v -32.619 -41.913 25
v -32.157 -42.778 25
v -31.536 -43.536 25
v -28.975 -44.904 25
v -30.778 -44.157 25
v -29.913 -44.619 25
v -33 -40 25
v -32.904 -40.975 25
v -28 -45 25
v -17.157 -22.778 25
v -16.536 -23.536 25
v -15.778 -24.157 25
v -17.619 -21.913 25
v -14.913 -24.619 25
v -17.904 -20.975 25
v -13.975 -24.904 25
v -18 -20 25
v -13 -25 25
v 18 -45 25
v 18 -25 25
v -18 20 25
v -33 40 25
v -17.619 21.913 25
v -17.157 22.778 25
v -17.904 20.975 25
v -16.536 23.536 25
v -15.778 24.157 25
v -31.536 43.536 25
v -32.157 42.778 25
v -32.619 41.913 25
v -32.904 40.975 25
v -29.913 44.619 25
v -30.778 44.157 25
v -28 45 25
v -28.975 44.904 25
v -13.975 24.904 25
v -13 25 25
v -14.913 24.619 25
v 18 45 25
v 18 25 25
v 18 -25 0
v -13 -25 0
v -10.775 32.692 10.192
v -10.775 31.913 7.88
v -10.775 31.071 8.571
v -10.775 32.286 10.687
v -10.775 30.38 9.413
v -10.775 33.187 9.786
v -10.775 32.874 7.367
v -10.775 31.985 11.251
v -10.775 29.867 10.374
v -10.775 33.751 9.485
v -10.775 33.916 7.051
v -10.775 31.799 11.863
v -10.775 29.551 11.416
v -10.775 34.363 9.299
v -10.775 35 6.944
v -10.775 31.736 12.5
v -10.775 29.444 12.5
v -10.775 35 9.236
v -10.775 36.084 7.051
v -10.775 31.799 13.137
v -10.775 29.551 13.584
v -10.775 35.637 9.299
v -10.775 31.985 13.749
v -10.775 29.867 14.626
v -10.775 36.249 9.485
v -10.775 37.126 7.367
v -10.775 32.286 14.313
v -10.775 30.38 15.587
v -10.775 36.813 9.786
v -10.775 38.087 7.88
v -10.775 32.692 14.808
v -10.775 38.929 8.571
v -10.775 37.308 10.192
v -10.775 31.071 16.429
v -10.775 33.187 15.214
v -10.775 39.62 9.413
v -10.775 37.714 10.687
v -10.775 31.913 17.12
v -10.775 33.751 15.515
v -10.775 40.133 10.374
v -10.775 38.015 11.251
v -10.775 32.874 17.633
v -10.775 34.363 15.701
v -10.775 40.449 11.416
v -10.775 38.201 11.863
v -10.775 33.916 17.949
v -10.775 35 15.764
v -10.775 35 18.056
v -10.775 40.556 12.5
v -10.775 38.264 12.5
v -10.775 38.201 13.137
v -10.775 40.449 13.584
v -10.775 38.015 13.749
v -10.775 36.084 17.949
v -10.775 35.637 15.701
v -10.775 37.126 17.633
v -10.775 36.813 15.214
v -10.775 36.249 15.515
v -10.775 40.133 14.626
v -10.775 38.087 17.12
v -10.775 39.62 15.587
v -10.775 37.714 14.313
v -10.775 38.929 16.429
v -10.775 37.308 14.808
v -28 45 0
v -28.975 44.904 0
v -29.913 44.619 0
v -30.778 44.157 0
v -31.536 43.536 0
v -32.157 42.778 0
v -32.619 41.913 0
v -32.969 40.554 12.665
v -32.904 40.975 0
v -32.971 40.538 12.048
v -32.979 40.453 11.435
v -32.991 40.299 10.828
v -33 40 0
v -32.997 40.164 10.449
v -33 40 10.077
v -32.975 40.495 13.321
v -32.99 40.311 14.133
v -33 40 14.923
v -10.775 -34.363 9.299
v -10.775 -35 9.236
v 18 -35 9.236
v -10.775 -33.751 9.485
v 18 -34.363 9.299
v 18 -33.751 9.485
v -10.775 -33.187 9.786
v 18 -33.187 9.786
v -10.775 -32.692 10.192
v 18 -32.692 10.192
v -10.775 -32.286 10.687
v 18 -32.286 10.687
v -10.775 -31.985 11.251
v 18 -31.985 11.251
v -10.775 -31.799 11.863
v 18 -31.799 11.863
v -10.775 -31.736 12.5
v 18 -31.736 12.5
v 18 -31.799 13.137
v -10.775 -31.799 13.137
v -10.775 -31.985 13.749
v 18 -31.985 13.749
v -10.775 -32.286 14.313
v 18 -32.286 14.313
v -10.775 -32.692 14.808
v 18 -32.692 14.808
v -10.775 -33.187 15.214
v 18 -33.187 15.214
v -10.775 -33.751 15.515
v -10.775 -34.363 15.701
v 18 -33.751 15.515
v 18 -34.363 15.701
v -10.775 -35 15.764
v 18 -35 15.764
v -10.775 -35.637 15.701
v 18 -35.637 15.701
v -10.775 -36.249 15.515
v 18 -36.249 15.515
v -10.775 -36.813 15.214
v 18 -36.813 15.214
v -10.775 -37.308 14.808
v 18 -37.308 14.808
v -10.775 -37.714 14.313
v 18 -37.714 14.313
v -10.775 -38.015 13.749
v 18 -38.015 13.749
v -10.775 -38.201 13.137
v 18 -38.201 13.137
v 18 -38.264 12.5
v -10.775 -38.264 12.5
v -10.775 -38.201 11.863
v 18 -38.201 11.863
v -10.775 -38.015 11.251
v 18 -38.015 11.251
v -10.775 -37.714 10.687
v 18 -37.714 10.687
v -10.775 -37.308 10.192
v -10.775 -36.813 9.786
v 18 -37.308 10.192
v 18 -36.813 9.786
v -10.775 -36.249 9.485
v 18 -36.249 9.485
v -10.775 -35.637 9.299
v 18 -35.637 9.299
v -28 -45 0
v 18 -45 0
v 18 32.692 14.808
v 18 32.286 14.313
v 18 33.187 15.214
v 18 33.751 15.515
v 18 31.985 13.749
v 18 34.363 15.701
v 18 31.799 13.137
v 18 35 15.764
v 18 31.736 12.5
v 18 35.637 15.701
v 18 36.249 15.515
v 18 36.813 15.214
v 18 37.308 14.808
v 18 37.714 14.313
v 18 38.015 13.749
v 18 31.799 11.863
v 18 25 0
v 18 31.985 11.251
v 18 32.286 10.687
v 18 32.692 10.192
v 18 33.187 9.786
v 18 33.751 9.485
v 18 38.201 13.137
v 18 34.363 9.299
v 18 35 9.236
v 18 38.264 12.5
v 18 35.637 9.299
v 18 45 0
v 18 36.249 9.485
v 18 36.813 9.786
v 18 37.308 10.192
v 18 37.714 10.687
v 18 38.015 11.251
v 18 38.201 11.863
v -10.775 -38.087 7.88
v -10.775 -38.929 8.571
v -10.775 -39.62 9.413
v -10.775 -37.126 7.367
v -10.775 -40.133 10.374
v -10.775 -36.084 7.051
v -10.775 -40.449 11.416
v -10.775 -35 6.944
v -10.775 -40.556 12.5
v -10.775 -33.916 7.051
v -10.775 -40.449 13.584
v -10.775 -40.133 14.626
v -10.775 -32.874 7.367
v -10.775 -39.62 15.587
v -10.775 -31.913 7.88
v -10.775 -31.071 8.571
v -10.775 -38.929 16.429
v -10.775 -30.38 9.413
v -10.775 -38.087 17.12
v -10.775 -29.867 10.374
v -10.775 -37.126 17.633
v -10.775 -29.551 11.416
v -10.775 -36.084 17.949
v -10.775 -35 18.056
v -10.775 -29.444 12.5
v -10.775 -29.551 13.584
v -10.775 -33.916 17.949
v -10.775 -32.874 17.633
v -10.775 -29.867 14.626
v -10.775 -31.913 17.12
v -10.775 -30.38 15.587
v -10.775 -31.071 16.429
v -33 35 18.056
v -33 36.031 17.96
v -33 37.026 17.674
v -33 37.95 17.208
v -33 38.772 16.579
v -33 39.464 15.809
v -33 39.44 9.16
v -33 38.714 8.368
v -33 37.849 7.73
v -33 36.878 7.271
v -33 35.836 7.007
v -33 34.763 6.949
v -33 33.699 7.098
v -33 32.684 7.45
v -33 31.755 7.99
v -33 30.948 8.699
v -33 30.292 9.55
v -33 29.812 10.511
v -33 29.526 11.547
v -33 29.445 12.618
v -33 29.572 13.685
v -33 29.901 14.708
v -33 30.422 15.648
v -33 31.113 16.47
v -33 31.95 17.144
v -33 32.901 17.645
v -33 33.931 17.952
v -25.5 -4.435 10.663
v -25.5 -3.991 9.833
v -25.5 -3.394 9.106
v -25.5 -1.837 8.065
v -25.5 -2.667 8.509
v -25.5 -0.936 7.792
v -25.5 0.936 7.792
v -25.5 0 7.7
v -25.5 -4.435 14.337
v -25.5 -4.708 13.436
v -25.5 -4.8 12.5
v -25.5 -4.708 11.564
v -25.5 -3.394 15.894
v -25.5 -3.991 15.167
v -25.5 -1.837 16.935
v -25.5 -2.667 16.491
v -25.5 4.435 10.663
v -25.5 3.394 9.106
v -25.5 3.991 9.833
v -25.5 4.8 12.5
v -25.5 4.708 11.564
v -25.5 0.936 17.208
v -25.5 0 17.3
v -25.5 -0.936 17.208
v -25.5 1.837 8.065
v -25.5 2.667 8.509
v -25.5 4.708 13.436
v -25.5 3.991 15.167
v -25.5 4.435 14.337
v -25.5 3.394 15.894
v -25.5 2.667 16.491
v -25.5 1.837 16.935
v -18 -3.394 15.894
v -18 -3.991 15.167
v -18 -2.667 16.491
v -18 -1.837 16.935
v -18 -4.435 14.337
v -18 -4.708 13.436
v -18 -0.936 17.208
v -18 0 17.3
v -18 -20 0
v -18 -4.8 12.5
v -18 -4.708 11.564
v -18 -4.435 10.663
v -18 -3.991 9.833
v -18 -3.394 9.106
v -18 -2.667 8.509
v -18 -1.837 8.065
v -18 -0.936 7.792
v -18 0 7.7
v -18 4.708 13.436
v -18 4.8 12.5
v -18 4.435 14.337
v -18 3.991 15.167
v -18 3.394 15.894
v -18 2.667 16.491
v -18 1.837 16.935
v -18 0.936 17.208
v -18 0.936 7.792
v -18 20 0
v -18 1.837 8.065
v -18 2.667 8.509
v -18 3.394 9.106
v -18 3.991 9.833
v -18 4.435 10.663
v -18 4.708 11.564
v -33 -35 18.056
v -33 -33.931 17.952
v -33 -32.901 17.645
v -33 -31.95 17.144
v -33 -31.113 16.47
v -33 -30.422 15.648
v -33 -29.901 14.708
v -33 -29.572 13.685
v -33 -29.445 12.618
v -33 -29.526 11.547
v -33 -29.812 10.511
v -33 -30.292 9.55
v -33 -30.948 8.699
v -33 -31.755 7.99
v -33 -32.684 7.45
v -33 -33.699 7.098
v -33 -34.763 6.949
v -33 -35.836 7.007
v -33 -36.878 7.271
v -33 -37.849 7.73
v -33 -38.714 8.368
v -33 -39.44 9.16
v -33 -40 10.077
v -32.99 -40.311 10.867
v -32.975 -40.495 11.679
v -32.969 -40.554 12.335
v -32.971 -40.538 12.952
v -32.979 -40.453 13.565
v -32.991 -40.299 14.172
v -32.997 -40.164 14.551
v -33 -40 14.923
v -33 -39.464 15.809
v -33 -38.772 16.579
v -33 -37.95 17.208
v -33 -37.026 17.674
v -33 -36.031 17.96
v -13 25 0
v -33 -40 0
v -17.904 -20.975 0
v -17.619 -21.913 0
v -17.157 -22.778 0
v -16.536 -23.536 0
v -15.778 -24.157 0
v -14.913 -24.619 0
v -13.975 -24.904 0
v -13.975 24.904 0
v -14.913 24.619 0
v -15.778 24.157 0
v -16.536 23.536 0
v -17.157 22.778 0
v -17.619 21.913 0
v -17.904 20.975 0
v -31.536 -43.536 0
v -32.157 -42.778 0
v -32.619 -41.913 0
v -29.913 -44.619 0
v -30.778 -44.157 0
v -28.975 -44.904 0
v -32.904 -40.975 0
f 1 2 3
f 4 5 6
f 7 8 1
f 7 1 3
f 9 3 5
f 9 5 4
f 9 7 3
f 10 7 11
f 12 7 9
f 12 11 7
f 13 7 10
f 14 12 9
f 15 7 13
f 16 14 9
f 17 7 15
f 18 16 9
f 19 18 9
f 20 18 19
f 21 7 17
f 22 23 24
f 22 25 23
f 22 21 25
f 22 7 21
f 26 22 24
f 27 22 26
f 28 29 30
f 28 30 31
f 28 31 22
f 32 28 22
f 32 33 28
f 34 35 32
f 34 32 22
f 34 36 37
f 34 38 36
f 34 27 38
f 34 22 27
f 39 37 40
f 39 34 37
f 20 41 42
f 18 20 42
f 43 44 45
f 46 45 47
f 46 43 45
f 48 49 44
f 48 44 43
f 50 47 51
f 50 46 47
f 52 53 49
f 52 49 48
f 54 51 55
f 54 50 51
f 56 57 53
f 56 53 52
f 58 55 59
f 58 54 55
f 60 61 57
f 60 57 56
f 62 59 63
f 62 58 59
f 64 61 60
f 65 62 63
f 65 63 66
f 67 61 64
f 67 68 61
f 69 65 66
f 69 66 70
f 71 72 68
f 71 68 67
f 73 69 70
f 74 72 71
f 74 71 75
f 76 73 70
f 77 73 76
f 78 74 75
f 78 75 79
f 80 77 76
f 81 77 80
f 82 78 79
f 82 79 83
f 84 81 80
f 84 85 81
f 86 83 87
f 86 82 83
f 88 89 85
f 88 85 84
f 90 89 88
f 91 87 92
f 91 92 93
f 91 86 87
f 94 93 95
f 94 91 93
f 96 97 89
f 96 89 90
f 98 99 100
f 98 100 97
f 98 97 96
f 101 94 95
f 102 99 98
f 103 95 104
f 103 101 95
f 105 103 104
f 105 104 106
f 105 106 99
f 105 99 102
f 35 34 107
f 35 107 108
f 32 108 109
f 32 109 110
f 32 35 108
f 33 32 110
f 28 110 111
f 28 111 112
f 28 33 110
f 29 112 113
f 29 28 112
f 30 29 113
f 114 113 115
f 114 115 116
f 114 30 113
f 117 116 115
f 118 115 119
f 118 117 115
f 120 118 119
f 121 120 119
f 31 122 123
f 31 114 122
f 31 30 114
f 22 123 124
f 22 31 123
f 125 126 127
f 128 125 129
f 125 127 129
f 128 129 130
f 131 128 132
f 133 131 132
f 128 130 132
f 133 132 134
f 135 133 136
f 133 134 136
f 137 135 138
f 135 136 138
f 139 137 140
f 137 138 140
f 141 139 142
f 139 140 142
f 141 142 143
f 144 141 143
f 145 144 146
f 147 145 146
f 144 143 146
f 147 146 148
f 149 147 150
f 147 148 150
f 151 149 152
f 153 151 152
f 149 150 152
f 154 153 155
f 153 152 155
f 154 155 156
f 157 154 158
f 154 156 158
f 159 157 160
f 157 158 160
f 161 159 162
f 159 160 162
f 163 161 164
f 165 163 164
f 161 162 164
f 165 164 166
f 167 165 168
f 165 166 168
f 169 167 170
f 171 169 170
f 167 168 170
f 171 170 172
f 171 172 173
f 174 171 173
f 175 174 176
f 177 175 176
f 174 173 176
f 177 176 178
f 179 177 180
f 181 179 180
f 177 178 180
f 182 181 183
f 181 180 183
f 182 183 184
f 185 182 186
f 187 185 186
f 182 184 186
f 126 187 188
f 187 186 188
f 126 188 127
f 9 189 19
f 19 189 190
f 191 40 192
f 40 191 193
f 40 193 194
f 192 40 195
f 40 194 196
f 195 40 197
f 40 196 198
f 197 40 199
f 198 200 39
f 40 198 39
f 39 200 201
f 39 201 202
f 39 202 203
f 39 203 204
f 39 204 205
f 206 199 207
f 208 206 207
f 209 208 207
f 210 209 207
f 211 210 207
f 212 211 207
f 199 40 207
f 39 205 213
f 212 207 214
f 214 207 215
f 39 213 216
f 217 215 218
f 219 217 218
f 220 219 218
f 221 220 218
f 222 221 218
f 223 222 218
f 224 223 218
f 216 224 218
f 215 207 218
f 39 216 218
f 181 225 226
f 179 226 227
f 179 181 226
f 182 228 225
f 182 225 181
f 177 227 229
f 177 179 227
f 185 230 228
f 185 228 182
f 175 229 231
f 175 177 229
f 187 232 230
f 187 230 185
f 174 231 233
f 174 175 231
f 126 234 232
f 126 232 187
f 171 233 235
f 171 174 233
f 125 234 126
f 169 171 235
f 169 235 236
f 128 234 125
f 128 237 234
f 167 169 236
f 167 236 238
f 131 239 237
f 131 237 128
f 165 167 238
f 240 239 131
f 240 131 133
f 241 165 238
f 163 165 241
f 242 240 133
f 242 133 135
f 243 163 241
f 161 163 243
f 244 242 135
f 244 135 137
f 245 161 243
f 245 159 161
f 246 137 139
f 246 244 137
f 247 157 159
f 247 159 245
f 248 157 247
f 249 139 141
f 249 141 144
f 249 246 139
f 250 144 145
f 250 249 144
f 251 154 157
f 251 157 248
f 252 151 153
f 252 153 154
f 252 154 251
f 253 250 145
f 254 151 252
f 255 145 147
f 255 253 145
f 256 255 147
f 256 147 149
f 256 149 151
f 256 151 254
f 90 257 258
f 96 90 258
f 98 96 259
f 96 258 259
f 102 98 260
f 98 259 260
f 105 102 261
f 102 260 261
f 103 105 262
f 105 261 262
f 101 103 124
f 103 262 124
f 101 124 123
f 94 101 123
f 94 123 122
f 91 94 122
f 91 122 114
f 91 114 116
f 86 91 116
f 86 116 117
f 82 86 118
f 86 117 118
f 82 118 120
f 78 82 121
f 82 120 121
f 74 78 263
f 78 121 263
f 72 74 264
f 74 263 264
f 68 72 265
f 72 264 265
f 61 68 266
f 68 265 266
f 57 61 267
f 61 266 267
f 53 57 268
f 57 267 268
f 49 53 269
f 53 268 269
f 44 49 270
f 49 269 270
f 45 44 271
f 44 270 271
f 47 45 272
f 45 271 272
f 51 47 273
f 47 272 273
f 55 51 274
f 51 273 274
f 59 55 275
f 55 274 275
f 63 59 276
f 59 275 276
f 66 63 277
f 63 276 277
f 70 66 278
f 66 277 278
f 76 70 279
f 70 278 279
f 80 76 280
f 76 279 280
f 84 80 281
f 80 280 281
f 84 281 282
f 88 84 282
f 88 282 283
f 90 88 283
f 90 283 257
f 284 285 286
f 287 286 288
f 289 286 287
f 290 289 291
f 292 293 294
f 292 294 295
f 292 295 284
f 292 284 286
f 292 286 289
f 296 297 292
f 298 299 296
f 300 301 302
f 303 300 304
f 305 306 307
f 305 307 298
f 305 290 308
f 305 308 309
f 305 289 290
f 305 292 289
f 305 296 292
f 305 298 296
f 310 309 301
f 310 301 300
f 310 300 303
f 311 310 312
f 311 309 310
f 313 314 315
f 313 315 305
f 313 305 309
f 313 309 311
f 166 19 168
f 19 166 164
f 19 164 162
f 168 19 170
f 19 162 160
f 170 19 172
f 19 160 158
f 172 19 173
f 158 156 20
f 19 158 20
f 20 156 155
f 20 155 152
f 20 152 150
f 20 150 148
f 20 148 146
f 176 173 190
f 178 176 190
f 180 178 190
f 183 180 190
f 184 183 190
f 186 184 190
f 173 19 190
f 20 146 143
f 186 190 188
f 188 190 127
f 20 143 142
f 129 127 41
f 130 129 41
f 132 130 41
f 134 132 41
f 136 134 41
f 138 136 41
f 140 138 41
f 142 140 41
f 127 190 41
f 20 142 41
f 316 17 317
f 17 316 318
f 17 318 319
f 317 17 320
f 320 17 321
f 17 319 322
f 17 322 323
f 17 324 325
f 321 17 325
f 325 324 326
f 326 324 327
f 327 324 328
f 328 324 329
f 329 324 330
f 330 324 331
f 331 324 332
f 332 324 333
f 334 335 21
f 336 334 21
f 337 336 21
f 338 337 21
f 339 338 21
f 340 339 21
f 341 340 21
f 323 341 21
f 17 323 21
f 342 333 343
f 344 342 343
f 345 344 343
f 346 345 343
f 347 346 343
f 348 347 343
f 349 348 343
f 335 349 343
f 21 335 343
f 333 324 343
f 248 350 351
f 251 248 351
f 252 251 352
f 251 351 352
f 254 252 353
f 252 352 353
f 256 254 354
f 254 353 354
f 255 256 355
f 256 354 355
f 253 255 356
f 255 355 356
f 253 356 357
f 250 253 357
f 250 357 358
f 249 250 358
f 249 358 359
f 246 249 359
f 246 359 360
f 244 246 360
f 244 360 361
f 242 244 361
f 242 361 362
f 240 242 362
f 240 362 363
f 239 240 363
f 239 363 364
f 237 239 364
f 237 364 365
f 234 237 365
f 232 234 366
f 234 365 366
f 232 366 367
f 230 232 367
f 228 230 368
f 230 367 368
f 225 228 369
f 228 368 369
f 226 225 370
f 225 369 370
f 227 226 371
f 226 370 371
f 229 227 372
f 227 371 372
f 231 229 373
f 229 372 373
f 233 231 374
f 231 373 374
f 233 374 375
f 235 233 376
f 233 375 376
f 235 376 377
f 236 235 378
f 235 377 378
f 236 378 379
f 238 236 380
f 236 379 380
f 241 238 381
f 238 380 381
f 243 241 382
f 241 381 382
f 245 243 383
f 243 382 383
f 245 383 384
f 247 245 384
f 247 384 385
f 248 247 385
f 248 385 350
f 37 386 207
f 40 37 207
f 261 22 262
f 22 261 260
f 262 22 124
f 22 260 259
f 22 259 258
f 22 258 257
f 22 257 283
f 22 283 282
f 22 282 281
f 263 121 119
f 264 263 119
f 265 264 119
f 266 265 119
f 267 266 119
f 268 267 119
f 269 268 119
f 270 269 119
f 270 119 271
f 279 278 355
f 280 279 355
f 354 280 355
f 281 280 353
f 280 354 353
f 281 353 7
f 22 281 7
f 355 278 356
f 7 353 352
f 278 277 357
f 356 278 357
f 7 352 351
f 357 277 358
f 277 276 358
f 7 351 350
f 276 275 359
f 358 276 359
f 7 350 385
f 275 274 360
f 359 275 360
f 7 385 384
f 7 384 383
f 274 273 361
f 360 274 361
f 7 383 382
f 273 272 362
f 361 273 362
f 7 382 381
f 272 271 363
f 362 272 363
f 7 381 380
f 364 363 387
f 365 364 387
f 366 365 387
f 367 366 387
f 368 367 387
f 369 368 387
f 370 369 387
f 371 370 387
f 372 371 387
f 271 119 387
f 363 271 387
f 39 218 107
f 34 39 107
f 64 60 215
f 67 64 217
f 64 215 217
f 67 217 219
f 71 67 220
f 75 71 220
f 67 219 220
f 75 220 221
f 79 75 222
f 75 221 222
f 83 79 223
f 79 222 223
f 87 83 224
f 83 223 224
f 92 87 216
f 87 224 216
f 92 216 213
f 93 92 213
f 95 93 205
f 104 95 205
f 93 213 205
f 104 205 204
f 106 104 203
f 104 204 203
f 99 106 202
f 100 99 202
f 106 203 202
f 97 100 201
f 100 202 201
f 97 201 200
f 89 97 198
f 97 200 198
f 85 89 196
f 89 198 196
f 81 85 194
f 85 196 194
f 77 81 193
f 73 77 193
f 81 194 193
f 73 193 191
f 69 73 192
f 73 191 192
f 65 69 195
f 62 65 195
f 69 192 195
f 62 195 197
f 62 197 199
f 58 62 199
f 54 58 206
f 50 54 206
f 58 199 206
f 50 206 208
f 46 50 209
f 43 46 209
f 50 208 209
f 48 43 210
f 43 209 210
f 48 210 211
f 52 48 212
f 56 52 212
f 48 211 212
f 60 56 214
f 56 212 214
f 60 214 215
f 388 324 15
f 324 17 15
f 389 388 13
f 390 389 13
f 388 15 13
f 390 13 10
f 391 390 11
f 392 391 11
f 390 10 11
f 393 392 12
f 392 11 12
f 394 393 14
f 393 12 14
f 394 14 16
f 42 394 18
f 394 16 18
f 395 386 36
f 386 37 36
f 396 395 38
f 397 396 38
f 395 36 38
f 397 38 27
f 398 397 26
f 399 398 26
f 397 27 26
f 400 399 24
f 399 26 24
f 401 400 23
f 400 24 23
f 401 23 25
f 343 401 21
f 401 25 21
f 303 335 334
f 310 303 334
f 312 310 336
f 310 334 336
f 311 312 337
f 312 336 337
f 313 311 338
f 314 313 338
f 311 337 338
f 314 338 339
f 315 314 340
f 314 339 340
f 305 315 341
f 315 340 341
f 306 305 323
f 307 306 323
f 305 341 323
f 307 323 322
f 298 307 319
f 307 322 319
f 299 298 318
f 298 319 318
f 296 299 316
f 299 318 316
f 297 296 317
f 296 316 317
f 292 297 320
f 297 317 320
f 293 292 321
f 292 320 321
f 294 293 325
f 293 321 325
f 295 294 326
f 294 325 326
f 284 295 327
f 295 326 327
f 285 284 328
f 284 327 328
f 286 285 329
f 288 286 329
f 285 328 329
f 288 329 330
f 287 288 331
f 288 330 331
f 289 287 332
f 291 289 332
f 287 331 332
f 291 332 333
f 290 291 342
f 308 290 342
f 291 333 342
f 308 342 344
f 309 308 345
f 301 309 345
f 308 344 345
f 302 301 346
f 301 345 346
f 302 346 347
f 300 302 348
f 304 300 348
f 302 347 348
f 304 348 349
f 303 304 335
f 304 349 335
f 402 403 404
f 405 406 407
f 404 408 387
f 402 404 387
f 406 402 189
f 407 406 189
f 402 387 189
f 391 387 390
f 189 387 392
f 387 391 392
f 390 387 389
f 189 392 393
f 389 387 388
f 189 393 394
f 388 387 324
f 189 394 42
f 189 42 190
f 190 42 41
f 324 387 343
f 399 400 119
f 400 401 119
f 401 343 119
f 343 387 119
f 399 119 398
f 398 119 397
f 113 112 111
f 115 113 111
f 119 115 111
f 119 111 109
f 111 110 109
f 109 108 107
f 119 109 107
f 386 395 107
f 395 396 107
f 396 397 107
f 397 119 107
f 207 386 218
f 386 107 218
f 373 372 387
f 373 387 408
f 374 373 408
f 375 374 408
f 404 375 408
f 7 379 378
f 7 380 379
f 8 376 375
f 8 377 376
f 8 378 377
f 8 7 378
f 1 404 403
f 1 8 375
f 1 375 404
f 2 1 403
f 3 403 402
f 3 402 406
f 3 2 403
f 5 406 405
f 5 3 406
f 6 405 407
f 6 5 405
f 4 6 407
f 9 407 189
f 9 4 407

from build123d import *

# Parameters (mm, degrees)
BOSS_EXTRUDE1_DEPTH                              = 25
SKETCH3_R                                        = 4.8
CUT_EXTRUDE1_DEPTH                               = 7.5
FILLET1_R                                        = 5
CBORE_FOR_1_4_SOCKET_HEAD_CAP_SCREW1_D           = 6.5278
CBORE_FOR_1_4_SOCKET_HEAD_CAP_SCREW1_CBORE_D     = 11.1125
CBORE_FOR_1_4_SOCKET_HEAD_CAP_SCREW1_CBORE_DEPTH = 22.225


with BuildPart() as part:
    # Sketch2 → Boss-Extrude1 (new body)
    with BuildSketch(Plane.XY):
        Polygon((-18, 25), (18, 25), (18, 45), (-33, 45), (-33, -45), (18, -45), (18, -25), (-18, -25), align=None)
    extrude(amount=BOSS_EXTRUDE1_DEPTH)

    # Sketch3 → Cut-Extrude1 (cut)
    with BuildSketch(Plane(origin=(-18, 0, 0), x_dir=(0, 0, -1), z_dir=(1, 0, 0))):
        with Locations(Location((-12.5, 0, 0), (0, 0, 90))):
            Circle(SKETCH3_R)
    extrude(amount=-CUT_EXTRUDE1_DEPTH, mode=Mode.SUBTRACT)

    # Fillet1
    fillet1_edges = [part.edges().sort_by_distance(p)[0] for p in [
        (-33, -45, 12.5),
        (-33, 45, 12.5),
        (-18, 25, 12.5),
        (-18, -25, 12.5),
    ]]
    fillet(fillet1_edges, radius=FILLET1_R)

    # CBORE for 1/4 Socket Head Cap Screw1 (through all)
    with Locations(Plane.ZY.offset(33)):
        with Locations((12.5, 35), (12.5, -35)):
            CounterBoreHole(CBORE_FOR_1_4_SOCKET_HEAD_CAP_SCREW1_D / 2, CBORE_FOR_1_4_SOCKET_HEAD_CAP_SCREW1_CBORE_D / 2, CBORE_FOR_1_4_SOCKET_HEAD_CAP_SCREW1_CBORE_DEPTH)


solid = part.part
